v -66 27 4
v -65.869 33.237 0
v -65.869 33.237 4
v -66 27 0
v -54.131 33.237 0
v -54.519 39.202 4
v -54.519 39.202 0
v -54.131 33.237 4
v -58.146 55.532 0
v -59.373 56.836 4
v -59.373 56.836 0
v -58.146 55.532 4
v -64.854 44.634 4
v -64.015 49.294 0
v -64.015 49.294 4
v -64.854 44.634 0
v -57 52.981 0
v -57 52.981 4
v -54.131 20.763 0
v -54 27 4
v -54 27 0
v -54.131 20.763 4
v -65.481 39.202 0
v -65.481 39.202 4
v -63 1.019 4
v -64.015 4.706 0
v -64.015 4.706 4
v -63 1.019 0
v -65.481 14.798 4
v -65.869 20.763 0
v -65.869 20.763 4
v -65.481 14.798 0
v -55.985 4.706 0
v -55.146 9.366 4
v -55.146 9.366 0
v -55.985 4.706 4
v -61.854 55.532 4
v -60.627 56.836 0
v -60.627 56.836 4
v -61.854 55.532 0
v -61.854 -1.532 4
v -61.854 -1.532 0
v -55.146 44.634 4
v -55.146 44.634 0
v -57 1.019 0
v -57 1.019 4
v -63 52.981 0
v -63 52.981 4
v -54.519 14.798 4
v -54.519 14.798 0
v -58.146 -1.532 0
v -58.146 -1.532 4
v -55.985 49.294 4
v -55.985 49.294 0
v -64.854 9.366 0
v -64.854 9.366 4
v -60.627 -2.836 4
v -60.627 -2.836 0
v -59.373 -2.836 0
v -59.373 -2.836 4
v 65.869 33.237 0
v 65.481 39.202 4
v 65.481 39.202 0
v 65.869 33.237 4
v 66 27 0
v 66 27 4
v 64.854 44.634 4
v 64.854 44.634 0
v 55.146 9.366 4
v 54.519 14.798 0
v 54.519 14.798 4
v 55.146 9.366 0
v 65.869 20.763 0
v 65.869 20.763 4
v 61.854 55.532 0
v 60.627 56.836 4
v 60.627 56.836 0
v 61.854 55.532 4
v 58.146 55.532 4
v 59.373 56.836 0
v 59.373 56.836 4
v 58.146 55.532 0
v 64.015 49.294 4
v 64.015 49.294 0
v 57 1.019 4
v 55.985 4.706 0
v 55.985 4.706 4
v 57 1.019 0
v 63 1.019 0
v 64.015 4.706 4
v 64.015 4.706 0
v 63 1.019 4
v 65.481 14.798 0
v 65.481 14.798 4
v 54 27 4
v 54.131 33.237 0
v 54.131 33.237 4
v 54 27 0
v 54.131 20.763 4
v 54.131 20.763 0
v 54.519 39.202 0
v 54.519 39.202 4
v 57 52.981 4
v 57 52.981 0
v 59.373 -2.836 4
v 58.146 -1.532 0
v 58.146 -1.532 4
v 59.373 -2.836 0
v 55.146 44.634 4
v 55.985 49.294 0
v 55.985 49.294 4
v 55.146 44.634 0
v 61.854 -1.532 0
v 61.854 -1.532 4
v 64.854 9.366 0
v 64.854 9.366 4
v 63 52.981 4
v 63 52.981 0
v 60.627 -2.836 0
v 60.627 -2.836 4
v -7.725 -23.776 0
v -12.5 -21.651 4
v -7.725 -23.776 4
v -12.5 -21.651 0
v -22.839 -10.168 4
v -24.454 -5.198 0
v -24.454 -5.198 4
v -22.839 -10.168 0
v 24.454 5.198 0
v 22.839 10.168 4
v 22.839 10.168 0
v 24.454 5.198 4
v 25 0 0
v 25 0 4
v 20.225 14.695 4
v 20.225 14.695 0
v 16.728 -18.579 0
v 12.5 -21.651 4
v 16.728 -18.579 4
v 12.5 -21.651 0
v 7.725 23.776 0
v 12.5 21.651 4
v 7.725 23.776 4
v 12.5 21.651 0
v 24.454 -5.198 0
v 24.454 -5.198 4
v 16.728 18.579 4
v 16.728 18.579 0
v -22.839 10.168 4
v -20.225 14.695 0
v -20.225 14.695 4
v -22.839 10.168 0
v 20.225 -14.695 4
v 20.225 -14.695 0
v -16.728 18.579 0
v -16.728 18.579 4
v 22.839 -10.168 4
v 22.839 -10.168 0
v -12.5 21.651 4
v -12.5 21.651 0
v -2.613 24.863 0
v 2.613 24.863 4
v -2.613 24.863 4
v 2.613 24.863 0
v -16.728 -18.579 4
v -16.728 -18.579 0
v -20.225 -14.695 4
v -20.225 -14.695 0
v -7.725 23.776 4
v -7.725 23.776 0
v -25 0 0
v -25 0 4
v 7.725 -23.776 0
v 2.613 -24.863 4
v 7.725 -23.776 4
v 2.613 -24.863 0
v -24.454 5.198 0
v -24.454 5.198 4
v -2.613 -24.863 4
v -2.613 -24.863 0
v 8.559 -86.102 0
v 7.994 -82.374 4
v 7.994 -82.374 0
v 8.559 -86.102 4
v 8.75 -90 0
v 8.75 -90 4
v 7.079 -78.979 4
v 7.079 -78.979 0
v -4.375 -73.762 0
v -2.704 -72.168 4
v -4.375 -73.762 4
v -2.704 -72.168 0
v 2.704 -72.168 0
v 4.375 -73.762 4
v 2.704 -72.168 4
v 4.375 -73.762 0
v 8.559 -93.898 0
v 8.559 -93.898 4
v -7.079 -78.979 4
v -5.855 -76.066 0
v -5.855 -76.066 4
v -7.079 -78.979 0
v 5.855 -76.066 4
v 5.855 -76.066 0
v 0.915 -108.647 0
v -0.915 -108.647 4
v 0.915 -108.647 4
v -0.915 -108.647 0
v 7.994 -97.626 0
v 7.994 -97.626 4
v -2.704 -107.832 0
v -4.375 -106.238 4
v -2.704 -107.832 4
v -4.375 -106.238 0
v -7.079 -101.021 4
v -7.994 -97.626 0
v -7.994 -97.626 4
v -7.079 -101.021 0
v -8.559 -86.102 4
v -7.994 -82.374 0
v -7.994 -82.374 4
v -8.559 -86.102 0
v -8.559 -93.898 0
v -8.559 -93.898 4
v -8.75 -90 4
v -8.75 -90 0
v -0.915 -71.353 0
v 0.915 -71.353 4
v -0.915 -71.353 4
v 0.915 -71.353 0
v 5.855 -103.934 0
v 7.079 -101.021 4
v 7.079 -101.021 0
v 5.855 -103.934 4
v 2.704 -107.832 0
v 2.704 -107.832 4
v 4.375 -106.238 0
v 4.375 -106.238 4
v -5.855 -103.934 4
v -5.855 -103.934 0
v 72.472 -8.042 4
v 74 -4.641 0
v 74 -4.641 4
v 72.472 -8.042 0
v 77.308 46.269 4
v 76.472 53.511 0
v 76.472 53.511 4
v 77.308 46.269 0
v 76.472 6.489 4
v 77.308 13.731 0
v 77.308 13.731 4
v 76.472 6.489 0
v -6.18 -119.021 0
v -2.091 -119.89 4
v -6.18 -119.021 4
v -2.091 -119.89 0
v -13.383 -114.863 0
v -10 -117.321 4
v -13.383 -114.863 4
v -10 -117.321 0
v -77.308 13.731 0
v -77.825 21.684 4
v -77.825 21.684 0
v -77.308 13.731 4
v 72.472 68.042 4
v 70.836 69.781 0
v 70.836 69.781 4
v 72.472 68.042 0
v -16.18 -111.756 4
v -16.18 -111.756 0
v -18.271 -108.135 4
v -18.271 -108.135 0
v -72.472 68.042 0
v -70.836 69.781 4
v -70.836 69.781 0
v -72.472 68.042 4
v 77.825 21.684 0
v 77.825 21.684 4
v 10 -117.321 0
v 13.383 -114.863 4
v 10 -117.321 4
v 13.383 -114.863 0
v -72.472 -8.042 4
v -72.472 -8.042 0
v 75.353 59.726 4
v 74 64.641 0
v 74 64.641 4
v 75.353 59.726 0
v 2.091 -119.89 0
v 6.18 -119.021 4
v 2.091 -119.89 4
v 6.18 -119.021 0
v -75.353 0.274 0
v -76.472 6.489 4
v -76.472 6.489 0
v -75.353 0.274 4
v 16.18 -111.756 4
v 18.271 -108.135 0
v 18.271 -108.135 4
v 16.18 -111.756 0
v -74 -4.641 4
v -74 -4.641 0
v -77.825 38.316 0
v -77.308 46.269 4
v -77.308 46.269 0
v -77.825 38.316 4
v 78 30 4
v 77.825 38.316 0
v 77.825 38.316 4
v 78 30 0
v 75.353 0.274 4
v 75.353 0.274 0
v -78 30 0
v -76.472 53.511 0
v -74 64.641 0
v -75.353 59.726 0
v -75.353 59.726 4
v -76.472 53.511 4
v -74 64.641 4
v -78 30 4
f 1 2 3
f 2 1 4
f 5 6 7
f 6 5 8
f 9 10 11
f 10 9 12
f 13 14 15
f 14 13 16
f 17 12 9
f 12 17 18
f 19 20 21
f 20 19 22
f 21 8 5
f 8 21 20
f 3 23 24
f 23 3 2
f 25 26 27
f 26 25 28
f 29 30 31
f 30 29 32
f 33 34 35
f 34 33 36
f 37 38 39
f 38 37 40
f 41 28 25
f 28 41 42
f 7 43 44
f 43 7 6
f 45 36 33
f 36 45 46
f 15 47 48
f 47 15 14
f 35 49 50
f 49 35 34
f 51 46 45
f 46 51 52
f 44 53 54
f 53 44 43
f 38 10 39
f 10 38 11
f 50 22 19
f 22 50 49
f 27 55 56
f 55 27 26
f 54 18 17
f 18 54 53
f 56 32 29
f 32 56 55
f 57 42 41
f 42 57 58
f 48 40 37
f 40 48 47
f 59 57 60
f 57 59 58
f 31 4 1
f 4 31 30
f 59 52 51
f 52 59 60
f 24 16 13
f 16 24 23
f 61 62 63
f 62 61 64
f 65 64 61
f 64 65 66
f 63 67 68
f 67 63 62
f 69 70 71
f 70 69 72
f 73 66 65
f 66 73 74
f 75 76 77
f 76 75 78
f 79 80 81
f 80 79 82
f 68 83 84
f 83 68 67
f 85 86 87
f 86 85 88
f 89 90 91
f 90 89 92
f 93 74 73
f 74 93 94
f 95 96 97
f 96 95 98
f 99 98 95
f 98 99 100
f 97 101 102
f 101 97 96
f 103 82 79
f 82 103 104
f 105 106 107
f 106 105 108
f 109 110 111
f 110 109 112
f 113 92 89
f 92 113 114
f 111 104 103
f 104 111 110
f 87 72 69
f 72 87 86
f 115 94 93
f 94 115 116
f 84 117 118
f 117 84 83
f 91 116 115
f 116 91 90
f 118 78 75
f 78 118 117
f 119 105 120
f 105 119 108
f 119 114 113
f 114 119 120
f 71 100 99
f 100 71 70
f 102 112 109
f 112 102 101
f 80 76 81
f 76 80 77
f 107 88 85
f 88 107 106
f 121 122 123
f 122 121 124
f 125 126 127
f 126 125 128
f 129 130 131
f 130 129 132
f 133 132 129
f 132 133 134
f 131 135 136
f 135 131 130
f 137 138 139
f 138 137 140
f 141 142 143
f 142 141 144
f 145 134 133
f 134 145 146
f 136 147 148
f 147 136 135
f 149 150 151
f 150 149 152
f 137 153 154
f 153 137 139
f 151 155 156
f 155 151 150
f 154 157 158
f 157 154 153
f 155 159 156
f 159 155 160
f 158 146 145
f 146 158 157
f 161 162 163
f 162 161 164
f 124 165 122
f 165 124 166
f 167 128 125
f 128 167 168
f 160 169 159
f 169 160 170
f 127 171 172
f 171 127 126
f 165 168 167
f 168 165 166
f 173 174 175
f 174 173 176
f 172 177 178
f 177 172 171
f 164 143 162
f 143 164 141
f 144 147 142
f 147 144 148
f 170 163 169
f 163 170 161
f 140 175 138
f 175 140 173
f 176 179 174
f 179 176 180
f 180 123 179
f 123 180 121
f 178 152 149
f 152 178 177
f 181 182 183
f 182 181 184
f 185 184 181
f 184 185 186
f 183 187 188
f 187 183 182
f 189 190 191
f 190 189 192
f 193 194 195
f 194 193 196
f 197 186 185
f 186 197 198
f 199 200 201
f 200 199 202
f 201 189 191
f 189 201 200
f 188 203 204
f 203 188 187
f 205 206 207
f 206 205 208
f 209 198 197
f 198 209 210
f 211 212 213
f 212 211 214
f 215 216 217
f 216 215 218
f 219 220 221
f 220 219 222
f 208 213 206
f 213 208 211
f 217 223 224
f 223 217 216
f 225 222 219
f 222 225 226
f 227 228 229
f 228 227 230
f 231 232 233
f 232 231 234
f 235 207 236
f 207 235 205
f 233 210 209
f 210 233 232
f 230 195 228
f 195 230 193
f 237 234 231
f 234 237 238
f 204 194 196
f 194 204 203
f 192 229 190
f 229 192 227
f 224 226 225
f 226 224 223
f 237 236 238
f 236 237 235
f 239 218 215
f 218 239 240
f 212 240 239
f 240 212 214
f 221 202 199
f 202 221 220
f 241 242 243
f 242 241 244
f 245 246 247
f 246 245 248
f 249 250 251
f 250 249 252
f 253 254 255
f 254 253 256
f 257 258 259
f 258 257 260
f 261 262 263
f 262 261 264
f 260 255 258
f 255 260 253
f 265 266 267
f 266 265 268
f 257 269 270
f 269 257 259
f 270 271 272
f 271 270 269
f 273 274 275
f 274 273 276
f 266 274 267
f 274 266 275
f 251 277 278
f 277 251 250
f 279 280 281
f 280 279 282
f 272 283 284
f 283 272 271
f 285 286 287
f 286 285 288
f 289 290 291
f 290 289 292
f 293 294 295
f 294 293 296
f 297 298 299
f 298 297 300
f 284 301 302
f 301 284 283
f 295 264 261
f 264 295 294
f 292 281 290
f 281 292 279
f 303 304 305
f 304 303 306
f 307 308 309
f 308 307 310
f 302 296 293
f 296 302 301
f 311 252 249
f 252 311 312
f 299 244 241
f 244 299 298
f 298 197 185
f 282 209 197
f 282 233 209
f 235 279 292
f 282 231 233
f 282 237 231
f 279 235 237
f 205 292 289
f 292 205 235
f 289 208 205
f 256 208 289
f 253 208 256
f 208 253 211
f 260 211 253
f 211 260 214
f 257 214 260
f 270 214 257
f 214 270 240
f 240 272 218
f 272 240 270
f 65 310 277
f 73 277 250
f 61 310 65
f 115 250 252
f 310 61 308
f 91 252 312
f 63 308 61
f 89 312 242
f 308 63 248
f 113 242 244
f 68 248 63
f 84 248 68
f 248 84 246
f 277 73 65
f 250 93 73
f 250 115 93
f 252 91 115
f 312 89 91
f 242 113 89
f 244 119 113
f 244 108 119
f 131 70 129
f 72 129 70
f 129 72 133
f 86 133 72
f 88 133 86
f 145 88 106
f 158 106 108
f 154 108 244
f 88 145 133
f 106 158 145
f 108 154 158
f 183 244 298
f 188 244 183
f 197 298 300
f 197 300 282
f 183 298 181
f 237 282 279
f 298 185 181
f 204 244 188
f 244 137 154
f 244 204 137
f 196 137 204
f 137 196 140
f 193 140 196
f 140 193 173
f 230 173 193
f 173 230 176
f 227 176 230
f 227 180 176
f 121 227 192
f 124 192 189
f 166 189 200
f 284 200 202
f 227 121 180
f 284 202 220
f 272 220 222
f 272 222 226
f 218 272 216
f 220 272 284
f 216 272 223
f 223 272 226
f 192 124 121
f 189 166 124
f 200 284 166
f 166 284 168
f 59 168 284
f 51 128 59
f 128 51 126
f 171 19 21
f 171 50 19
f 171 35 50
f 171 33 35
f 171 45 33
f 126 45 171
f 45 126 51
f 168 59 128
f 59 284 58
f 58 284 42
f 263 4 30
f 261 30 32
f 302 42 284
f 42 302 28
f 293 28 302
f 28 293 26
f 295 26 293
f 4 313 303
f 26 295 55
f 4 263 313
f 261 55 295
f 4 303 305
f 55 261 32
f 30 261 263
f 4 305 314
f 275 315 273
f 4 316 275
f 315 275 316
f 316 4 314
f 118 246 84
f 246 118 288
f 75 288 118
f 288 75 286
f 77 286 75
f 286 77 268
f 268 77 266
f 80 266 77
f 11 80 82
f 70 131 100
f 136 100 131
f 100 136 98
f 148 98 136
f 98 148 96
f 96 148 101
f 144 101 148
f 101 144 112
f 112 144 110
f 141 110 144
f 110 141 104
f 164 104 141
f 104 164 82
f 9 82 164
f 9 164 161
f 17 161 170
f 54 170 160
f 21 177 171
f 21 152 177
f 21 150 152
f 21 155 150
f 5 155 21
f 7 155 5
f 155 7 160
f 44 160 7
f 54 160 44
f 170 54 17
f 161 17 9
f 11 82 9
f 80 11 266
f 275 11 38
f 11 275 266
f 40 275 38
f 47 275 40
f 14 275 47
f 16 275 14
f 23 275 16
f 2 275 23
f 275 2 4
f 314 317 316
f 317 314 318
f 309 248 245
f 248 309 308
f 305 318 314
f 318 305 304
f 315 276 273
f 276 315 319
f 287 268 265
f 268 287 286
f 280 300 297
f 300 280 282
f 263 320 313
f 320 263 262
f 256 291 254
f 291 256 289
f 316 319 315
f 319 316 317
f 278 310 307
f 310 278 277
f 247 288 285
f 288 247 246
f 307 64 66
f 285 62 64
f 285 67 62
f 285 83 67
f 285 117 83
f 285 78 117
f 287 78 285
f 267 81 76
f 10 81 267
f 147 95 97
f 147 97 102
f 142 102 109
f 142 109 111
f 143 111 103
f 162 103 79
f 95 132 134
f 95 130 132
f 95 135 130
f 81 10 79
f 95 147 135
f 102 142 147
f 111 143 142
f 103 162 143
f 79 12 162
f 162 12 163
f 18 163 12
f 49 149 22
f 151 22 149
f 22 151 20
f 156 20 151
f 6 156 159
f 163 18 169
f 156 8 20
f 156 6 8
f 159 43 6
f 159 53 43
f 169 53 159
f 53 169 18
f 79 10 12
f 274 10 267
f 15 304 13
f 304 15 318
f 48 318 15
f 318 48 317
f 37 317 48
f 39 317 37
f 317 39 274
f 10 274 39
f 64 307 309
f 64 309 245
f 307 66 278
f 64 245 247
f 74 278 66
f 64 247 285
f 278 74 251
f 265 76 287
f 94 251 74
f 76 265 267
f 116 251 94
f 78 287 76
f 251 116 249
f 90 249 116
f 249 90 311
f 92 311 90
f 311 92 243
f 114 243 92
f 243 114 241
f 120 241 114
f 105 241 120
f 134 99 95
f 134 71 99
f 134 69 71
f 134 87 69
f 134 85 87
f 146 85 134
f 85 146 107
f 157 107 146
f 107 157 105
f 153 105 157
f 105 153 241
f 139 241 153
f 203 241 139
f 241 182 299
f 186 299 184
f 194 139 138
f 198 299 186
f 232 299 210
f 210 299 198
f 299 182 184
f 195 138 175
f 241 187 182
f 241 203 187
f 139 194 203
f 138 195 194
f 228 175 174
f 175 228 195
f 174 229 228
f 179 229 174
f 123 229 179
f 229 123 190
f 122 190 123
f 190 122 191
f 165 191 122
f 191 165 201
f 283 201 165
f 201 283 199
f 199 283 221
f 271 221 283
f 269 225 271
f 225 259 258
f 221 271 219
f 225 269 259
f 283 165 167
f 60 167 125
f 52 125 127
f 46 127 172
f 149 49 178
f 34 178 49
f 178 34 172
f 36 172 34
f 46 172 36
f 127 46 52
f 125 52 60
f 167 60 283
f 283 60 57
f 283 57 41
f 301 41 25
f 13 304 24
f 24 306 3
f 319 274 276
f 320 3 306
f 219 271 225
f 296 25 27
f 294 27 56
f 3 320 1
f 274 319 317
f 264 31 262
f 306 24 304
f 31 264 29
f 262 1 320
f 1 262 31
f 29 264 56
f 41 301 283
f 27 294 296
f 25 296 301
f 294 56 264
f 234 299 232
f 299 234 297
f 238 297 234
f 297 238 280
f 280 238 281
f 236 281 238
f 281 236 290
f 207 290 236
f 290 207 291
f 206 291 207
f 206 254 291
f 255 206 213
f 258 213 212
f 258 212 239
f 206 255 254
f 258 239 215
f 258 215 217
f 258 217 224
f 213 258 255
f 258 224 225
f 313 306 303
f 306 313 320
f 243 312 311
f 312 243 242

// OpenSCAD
straponhole = 50; belt =70; buttstrap =100; thiknes= 4; //up to 20mm or 2cm
difference()
{
union(){
hull(){
translate([-belt,30,0])scale([0.4,2,1])cylinder(thiknes,20,20,center=false); //Left
translate([belt,30,0])scale([0.4,2,1])cylinder(thiknes,20,20,center=false); //Right
translate([0,-buttstrap,0])cylinder(thiknes,20,20,center=false); //Buttom
}
}

union(){
translate([-(belt-10),27,-1])scale([0.3,1.5,1])cylinder(20,20,20,center=false); //L-belt
translate([(belt-10),27,-1])scale([0.3,1.5,1])cylinder(20,20,20,center=false); //R-belt
translate([0,0,-1])cylinder(20,d=straponhole,center=false); //strapon
translate([0,-(buttstrap-10),-1])scale([0.7,1.5,1])cylinder(20,d=25,center=false); //buttstrap
}

}
